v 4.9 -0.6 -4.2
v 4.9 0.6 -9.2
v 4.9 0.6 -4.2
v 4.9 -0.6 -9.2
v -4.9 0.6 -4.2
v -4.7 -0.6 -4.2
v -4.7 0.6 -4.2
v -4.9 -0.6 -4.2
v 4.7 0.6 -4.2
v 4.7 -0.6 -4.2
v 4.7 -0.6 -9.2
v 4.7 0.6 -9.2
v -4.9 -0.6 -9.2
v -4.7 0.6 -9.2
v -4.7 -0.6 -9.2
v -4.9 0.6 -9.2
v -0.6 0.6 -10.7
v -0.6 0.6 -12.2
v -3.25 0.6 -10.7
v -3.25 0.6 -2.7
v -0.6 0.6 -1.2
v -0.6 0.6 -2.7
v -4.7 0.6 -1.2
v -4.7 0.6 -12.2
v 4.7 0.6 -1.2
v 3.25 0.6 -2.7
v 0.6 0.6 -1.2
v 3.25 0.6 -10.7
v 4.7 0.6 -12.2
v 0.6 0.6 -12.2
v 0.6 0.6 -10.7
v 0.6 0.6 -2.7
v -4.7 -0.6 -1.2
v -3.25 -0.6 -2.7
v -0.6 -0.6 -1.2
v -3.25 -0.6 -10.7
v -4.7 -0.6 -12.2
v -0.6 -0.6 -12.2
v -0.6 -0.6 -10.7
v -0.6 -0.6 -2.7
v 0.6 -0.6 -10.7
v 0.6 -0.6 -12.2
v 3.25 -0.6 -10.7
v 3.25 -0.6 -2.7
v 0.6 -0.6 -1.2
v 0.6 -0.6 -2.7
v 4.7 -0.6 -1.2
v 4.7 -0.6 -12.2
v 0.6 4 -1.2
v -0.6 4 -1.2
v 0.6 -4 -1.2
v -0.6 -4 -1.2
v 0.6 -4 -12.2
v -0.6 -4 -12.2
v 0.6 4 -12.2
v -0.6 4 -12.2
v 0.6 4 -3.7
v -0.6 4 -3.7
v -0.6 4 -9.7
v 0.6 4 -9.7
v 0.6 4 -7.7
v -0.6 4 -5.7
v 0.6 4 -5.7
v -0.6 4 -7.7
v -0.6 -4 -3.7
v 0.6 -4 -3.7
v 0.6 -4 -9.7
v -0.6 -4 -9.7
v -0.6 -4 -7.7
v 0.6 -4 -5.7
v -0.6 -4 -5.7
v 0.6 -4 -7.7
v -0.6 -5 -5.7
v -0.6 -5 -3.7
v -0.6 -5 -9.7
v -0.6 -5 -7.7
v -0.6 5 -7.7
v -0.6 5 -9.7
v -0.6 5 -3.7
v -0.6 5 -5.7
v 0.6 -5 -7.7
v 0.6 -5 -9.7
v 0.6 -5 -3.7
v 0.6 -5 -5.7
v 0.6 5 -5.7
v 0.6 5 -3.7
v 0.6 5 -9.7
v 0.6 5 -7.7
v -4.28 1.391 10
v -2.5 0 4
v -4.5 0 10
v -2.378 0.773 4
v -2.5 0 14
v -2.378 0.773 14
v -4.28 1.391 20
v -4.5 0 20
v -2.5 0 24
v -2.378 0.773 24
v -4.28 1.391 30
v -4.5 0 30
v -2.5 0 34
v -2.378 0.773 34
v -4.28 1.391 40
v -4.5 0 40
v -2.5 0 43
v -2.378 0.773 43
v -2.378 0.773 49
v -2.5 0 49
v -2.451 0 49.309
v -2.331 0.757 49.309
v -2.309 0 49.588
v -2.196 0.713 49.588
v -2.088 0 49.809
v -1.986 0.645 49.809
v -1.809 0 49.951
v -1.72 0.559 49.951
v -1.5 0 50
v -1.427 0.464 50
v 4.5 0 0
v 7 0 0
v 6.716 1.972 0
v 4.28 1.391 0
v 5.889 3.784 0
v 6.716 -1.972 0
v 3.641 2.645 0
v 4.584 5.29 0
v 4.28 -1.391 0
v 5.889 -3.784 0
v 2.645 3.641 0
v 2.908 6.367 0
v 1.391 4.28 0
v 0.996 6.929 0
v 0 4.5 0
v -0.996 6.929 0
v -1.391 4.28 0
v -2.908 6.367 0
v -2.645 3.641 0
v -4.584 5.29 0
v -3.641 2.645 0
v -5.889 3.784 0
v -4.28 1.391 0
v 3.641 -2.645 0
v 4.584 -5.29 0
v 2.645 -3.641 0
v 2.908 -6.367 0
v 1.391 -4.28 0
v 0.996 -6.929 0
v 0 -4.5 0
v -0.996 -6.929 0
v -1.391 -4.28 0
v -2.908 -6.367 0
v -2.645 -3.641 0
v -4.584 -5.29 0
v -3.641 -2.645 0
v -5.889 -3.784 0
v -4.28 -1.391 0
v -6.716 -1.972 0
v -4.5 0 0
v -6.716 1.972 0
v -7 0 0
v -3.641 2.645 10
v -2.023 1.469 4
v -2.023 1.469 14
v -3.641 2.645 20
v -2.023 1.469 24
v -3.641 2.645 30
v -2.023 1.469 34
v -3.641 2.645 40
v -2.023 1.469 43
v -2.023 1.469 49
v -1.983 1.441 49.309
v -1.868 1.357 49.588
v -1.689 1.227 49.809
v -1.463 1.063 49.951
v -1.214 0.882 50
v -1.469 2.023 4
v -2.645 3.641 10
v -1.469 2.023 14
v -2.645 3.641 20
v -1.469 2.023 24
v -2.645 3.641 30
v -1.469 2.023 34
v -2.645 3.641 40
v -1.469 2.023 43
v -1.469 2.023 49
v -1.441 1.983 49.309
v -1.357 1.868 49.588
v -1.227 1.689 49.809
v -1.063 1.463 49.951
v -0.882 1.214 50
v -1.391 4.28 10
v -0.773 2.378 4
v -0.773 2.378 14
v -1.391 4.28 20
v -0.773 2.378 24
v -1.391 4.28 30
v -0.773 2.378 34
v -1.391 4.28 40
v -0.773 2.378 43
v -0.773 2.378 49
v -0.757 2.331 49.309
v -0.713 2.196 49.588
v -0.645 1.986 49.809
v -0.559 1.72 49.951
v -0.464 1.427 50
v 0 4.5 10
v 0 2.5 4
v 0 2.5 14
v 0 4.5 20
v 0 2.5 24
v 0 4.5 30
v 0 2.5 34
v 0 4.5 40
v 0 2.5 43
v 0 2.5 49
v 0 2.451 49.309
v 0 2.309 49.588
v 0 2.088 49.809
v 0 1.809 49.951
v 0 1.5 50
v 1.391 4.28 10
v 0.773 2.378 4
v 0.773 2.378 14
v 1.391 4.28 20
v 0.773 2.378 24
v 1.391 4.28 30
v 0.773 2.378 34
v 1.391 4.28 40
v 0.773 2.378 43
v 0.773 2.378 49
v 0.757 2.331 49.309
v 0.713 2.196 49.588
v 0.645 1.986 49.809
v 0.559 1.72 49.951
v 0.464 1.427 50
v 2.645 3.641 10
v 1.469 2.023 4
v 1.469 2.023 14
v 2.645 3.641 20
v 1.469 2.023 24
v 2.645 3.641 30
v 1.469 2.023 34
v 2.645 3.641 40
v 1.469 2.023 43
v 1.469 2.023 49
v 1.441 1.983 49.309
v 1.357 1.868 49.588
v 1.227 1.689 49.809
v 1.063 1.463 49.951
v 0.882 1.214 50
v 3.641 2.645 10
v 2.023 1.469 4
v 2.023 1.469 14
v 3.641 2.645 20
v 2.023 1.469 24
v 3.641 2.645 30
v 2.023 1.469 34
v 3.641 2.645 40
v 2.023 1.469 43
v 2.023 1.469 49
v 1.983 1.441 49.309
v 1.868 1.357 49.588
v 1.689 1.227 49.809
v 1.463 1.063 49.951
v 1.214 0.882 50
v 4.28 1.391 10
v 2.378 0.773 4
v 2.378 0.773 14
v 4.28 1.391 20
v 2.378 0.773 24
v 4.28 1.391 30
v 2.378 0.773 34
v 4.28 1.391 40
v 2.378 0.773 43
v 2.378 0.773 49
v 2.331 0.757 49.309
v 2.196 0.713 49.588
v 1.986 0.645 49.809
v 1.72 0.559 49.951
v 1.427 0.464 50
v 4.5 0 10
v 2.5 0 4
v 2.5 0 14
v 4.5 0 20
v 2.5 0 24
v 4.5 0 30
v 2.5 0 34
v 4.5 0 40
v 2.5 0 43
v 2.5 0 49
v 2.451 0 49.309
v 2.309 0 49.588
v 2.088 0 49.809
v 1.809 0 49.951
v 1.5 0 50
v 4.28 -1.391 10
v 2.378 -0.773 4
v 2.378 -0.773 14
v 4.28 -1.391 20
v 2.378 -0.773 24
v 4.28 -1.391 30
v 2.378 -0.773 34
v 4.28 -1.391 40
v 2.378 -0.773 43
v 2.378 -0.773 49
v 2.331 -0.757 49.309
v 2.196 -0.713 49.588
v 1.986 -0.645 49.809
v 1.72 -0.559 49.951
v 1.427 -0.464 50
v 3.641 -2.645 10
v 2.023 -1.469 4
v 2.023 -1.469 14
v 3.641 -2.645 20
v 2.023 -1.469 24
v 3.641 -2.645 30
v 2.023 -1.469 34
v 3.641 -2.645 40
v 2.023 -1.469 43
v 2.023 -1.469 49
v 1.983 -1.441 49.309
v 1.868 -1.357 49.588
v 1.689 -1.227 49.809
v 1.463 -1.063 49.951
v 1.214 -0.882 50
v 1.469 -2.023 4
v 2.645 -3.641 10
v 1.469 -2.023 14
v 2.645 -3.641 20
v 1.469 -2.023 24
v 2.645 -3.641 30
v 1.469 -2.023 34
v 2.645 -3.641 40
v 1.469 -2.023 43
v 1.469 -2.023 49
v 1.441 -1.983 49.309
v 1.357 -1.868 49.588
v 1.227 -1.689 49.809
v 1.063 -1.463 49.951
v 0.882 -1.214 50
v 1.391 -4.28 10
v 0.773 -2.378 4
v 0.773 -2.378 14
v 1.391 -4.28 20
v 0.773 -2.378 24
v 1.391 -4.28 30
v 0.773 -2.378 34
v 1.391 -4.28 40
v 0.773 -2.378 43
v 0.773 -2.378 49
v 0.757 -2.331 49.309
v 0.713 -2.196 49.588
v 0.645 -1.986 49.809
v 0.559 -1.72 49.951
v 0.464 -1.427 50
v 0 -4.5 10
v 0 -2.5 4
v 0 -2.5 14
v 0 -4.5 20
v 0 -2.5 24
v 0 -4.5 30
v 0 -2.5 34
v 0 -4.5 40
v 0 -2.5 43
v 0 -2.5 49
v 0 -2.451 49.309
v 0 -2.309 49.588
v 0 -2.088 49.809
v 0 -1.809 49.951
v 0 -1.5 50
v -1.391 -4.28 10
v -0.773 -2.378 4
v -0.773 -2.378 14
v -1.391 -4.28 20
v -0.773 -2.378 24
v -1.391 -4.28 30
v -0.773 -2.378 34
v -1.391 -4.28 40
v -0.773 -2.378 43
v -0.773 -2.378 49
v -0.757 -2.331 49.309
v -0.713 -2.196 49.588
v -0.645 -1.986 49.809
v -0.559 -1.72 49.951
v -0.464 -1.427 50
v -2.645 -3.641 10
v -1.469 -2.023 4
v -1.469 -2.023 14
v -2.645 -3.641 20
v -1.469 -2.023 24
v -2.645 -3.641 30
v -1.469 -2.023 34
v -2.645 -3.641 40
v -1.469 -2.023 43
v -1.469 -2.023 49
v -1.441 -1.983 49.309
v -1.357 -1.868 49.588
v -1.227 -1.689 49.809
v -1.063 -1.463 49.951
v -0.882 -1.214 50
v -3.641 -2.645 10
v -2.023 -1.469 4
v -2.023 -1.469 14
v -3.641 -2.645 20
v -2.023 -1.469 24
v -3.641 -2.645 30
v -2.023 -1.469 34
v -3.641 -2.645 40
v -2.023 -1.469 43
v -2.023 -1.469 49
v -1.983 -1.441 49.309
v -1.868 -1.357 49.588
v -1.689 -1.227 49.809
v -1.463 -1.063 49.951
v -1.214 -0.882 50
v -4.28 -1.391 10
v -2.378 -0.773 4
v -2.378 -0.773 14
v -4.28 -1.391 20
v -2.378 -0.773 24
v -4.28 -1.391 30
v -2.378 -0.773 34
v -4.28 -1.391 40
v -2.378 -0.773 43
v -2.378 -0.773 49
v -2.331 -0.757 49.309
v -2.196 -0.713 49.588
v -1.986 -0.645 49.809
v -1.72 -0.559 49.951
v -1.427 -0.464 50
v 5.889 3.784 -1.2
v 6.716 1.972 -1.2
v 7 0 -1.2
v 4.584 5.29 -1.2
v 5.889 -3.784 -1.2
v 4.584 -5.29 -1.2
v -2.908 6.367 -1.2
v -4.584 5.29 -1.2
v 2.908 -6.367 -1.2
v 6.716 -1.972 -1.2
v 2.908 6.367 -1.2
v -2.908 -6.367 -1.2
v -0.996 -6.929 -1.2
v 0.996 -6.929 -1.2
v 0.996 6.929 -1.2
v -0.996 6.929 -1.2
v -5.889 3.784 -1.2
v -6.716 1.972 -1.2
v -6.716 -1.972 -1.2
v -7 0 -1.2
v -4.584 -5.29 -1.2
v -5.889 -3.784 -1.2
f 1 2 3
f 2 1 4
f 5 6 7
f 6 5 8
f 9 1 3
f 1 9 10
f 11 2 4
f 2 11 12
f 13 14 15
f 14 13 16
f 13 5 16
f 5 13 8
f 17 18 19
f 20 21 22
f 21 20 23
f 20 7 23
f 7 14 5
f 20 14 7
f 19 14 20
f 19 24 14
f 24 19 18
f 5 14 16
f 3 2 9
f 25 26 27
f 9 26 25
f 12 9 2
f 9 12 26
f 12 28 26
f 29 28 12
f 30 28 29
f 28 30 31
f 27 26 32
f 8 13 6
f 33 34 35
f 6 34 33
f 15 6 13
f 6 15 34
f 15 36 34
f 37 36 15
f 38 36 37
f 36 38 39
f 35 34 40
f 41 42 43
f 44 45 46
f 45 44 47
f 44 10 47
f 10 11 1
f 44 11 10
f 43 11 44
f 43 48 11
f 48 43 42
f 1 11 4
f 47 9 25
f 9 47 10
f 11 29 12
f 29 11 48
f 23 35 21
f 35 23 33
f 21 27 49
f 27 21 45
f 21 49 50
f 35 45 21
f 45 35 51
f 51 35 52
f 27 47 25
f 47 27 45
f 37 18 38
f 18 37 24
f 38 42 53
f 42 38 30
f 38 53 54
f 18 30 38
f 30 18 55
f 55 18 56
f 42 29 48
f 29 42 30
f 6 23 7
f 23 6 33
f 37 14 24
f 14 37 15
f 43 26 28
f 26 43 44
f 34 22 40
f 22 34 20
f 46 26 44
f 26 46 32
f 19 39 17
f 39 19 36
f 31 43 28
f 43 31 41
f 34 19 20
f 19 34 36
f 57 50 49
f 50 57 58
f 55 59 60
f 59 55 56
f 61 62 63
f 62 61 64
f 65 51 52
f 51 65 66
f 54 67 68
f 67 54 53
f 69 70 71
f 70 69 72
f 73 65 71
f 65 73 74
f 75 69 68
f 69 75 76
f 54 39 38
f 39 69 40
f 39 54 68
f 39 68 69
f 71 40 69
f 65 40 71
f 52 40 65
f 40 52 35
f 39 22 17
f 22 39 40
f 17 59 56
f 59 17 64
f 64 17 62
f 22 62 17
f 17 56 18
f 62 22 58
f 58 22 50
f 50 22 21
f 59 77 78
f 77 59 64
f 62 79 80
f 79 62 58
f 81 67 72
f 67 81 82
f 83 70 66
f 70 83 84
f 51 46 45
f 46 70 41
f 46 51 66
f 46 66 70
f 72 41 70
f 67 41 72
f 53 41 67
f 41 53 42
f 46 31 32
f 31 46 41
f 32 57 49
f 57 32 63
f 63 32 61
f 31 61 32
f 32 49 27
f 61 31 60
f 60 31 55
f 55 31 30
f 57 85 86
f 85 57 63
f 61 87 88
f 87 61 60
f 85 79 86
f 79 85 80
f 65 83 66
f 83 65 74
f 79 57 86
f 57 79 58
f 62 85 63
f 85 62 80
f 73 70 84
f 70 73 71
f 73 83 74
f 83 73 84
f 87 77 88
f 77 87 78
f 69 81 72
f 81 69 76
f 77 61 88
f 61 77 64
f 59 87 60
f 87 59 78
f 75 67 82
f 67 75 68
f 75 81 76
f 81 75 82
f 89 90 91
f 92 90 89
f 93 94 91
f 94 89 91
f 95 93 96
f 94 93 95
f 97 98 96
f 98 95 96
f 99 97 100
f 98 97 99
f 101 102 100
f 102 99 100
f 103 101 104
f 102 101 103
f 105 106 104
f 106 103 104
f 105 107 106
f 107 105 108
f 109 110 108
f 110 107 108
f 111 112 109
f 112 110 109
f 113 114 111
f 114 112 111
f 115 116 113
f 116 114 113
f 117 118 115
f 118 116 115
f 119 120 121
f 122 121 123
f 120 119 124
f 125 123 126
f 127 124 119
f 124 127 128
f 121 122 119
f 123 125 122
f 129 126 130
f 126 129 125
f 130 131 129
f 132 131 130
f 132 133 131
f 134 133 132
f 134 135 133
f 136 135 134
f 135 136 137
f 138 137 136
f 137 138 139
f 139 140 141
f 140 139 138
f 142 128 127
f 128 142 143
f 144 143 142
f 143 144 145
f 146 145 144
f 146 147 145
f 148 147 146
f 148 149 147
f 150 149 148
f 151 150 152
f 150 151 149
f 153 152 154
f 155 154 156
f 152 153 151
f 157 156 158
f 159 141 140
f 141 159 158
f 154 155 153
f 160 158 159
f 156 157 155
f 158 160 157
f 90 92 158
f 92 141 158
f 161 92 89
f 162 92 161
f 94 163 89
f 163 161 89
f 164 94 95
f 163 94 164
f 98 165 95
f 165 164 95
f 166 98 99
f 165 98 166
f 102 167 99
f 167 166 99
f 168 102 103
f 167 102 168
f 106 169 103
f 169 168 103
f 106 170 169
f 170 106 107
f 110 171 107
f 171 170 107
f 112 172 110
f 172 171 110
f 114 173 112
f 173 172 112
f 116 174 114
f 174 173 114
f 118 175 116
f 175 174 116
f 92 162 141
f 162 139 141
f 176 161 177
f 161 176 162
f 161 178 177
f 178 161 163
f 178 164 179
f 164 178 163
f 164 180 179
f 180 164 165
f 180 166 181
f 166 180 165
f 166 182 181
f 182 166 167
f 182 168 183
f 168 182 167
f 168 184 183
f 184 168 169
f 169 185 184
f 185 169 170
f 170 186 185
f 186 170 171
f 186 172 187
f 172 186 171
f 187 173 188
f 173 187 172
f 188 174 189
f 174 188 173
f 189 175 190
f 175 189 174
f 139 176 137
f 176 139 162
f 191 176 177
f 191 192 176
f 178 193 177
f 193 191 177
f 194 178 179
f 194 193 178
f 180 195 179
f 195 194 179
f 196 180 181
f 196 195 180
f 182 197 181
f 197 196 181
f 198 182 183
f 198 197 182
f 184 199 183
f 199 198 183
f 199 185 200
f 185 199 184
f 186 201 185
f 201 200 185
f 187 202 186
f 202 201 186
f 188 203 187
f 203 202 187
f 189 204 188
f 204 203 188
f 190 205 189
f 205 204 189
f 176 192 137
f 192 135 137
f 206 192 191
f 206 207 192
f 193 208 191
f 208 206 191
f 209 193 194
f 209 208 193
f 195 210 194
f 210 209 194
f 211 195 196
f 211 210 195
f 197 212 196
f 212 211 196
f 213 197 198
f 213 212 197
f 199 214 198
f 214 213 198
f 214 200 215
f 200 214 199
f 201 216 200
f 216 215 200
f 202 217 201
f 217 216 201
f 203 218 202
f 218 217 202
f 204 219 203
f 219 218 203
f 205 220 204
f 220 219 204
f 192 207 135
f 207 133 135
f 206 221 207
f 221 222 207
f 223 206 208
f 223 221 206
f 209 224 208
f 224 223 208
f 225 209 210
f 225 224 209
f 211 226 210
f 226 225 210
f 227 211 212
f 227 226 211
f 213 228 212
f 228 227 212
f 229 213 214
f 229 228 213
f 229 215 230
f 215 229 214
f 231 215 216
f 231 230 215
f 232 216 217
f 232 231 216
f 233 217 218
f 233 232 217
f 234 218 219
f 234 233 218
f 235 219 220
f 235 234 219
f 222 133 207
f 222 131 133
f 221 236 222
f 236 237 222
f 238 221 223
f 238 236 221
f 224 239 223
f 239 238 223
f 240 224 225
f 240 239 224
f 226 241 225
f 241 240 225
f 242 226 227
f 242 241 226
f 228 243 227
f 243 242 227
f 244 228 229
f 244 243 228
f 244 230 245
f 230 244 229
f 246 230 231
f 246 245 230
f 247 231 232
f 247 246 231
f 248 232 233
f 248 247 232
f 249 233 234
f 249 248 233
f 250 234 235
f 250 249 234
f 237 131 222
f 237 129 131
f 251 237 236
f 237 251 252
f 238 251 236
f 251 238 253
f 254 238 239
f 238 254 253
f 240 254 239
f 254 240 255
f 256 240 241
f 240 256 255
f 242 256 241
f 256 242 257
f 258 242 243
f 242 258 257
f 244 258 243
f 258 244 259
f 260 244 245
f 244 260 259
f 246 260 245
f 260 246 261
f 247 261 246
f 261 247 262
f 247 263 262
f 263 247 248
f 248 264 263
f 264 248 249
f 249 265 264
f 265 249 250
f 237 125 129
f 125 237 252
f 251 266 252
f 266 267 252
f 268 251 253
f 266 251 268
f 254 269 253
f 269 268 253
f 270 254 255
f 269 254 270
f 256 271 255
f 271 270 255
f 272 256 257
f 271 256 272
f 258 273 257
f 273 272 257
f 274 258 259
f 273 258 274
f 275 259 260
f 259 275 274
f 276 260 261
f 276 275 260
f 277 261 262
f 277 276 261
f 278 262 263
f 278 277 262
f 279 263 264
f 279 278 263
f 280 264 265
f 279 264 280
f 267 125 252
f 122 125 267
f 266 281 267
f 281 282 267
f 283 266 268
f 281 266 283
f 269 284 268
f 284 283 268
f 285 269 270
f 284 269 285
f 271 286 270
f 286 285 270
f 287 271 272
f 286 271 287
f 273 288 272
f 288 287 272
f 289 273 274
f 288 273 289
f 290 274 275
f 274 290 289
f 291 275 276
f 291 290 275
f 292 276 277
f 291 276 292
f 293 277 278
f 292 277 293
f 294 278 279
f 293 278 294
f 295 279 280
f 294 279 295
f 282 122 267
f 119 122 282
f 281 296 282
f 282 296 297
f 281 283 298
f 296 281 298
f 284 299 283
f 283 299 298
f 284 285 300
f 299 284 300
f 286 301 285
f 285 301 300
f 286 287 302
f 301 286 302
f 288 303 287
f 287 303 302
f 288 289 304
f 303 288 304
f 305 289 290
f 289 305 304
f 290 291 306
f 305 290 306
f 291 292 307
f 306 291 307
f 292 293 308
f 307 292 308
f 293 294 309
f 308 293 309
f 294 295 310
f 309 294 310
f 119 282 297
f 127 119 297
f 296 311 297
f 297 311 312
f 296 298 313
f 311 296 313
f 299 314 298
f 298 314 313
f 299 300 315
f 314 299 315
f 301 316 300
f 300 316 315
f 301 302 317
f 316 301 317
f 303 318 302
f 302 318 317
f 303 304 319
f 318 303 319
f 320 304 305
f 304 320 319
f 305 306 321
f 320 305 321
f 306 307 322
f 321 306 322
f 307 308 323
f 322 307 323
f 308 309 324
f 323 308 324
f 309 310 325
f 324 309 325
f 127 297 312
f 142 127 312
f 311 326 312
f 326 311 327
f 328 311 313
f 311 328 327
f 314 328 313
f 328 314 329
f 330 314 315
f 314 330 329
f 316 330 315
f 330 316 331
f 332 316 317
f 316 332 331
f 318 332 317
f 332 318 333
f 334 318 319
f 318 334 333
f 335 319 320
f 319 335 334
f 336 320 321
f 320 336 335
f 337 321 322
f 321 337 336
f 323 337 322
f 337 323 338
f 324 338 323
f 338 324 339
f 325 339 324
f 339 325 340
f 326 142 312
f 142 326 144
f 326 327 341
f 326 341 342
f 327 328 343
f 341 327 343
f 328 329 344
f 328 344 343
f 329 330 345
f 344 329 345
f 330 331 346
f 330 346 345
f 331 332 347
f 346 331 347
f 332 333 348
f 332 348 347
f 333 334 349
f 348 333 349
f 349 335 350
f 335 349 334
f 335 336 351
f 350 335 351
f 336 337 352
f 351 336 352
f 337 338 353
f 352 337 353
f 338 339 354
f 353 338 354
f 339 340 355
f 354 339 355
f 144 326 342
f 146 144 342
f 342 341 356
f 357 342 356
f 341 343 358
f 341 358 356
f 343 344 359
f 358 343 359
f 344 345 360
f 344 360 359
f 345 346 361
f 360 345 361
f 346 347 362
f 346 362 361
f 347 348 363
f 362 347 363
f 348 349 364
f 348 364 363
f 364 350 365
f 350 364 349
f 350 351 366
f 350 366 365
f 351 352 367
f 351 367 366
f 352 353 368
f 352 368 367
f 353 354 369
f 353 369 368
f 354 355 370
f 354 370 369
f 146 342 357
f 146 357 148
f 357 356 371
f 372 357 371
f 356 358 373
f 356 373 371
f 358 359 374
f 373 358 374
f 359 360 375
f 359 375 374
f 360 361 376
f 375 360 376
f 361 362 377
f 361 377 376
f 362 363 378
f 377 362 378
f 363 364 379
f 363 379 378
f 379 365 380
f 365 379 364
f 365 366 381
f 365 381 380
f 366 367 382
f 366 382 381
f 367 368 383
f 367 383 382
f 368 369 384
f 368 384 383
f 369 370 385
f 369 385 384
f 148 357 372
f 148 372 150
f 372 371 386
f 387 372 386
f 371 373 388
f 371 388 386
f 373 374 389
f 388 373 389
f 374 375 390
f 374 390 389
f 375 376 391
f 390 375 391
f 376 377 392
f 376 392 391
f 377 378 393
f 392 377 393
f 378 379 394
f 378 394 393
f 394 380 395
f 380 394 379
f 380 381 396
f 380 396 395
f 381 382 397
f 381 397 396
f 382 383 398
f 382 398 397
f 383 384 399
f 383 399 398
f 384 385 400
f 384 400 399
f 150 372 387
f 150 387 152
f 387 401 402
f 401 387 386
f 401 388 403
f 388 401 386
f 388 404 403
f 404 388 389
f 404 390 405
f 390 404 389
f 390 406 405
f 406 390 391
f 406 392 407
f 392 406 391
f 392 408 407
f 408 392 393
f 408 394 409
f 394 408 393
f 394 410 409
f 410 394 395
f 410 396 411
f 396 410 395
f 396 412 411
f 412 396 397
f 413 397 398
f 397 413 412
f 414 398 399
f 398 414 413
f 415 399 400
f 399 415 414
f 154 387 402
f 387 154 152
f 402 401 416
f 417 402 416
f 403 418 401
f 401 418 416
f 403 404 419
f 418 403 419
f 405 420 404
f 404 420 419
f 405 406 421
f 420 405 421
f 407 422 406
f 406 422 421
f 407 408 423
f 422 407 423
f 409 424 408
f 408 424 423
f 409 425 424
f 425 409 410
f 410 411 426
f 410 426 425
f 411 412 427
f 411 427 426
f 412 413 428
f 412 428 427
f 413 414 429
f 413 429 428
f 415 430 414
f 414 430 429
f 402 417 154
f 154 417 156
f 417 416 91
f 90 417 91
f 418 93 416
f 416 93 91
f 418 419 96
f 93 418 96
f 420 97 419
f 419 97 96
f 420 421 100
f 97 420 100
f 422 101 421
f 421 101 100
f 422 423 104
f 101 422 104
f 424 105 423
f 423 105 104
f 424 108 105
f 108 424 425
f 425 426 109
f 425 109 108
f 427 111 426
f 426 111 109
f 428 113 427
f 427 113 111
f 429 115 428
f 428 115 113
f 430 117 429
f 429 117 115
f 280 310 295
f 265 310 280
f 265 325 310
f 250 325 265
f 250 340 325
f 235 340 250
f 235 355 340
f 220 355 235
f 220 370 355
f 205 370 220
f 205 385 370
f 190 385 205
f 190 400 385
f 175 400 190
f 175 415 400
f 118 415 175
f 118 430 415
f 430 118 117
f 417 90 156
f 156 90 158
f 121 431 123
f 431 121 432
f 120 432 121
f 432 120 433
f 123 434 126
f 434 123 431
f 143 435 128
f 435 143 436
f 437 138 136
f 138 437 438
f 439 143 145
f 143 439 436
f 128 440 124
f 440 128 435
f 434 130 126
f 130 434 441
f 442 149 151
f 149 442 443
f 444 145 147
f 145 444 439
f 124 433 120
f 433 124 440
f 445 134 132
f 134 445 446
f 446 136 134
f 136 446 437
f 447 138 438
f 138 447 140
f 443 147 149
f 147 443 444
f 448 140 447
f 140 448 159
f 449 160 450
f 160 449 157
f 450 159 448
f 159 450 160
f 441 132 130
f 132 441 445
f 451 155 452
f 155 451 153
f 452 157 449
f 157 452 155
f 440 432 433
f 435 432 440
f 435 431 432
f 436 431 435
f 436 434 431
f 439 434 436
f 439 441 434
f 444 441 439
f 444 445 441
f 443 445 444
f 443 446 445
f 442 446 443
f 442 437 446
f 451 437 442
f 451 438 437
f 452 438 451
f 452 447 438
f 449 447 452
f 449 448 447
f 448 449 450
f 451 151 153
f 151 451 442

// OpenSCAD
HeightZwischenStueck=1.2;
HeightWurzel=50;
HeightFitter=11;


rotate_extrude($fn=20) import("wurzel.dxf");

translate([0,0,-HeightZwischenStueck]) cylinder(r=7,h=HeightZwischenStueck);

translate([0,0,-HeightFitter/2 - HeightZwischenStueck]) {
  difference() {
     union() {
       cube([9.8,1.2,5], center=true);
       cube([9.4,1.2,HeightFitter], center=true);
     }
     cube([6.5,1.5,8], center=true);
  }

  rotate([0,0,90]) {
     cube([8,1.2,HeightFitter], center=true);
     translate([0,0,2]) cube([10,1.2,2], center=true);
     translate([0,0,-2]) cube([10,1.2,2], center=true);
  }
}
